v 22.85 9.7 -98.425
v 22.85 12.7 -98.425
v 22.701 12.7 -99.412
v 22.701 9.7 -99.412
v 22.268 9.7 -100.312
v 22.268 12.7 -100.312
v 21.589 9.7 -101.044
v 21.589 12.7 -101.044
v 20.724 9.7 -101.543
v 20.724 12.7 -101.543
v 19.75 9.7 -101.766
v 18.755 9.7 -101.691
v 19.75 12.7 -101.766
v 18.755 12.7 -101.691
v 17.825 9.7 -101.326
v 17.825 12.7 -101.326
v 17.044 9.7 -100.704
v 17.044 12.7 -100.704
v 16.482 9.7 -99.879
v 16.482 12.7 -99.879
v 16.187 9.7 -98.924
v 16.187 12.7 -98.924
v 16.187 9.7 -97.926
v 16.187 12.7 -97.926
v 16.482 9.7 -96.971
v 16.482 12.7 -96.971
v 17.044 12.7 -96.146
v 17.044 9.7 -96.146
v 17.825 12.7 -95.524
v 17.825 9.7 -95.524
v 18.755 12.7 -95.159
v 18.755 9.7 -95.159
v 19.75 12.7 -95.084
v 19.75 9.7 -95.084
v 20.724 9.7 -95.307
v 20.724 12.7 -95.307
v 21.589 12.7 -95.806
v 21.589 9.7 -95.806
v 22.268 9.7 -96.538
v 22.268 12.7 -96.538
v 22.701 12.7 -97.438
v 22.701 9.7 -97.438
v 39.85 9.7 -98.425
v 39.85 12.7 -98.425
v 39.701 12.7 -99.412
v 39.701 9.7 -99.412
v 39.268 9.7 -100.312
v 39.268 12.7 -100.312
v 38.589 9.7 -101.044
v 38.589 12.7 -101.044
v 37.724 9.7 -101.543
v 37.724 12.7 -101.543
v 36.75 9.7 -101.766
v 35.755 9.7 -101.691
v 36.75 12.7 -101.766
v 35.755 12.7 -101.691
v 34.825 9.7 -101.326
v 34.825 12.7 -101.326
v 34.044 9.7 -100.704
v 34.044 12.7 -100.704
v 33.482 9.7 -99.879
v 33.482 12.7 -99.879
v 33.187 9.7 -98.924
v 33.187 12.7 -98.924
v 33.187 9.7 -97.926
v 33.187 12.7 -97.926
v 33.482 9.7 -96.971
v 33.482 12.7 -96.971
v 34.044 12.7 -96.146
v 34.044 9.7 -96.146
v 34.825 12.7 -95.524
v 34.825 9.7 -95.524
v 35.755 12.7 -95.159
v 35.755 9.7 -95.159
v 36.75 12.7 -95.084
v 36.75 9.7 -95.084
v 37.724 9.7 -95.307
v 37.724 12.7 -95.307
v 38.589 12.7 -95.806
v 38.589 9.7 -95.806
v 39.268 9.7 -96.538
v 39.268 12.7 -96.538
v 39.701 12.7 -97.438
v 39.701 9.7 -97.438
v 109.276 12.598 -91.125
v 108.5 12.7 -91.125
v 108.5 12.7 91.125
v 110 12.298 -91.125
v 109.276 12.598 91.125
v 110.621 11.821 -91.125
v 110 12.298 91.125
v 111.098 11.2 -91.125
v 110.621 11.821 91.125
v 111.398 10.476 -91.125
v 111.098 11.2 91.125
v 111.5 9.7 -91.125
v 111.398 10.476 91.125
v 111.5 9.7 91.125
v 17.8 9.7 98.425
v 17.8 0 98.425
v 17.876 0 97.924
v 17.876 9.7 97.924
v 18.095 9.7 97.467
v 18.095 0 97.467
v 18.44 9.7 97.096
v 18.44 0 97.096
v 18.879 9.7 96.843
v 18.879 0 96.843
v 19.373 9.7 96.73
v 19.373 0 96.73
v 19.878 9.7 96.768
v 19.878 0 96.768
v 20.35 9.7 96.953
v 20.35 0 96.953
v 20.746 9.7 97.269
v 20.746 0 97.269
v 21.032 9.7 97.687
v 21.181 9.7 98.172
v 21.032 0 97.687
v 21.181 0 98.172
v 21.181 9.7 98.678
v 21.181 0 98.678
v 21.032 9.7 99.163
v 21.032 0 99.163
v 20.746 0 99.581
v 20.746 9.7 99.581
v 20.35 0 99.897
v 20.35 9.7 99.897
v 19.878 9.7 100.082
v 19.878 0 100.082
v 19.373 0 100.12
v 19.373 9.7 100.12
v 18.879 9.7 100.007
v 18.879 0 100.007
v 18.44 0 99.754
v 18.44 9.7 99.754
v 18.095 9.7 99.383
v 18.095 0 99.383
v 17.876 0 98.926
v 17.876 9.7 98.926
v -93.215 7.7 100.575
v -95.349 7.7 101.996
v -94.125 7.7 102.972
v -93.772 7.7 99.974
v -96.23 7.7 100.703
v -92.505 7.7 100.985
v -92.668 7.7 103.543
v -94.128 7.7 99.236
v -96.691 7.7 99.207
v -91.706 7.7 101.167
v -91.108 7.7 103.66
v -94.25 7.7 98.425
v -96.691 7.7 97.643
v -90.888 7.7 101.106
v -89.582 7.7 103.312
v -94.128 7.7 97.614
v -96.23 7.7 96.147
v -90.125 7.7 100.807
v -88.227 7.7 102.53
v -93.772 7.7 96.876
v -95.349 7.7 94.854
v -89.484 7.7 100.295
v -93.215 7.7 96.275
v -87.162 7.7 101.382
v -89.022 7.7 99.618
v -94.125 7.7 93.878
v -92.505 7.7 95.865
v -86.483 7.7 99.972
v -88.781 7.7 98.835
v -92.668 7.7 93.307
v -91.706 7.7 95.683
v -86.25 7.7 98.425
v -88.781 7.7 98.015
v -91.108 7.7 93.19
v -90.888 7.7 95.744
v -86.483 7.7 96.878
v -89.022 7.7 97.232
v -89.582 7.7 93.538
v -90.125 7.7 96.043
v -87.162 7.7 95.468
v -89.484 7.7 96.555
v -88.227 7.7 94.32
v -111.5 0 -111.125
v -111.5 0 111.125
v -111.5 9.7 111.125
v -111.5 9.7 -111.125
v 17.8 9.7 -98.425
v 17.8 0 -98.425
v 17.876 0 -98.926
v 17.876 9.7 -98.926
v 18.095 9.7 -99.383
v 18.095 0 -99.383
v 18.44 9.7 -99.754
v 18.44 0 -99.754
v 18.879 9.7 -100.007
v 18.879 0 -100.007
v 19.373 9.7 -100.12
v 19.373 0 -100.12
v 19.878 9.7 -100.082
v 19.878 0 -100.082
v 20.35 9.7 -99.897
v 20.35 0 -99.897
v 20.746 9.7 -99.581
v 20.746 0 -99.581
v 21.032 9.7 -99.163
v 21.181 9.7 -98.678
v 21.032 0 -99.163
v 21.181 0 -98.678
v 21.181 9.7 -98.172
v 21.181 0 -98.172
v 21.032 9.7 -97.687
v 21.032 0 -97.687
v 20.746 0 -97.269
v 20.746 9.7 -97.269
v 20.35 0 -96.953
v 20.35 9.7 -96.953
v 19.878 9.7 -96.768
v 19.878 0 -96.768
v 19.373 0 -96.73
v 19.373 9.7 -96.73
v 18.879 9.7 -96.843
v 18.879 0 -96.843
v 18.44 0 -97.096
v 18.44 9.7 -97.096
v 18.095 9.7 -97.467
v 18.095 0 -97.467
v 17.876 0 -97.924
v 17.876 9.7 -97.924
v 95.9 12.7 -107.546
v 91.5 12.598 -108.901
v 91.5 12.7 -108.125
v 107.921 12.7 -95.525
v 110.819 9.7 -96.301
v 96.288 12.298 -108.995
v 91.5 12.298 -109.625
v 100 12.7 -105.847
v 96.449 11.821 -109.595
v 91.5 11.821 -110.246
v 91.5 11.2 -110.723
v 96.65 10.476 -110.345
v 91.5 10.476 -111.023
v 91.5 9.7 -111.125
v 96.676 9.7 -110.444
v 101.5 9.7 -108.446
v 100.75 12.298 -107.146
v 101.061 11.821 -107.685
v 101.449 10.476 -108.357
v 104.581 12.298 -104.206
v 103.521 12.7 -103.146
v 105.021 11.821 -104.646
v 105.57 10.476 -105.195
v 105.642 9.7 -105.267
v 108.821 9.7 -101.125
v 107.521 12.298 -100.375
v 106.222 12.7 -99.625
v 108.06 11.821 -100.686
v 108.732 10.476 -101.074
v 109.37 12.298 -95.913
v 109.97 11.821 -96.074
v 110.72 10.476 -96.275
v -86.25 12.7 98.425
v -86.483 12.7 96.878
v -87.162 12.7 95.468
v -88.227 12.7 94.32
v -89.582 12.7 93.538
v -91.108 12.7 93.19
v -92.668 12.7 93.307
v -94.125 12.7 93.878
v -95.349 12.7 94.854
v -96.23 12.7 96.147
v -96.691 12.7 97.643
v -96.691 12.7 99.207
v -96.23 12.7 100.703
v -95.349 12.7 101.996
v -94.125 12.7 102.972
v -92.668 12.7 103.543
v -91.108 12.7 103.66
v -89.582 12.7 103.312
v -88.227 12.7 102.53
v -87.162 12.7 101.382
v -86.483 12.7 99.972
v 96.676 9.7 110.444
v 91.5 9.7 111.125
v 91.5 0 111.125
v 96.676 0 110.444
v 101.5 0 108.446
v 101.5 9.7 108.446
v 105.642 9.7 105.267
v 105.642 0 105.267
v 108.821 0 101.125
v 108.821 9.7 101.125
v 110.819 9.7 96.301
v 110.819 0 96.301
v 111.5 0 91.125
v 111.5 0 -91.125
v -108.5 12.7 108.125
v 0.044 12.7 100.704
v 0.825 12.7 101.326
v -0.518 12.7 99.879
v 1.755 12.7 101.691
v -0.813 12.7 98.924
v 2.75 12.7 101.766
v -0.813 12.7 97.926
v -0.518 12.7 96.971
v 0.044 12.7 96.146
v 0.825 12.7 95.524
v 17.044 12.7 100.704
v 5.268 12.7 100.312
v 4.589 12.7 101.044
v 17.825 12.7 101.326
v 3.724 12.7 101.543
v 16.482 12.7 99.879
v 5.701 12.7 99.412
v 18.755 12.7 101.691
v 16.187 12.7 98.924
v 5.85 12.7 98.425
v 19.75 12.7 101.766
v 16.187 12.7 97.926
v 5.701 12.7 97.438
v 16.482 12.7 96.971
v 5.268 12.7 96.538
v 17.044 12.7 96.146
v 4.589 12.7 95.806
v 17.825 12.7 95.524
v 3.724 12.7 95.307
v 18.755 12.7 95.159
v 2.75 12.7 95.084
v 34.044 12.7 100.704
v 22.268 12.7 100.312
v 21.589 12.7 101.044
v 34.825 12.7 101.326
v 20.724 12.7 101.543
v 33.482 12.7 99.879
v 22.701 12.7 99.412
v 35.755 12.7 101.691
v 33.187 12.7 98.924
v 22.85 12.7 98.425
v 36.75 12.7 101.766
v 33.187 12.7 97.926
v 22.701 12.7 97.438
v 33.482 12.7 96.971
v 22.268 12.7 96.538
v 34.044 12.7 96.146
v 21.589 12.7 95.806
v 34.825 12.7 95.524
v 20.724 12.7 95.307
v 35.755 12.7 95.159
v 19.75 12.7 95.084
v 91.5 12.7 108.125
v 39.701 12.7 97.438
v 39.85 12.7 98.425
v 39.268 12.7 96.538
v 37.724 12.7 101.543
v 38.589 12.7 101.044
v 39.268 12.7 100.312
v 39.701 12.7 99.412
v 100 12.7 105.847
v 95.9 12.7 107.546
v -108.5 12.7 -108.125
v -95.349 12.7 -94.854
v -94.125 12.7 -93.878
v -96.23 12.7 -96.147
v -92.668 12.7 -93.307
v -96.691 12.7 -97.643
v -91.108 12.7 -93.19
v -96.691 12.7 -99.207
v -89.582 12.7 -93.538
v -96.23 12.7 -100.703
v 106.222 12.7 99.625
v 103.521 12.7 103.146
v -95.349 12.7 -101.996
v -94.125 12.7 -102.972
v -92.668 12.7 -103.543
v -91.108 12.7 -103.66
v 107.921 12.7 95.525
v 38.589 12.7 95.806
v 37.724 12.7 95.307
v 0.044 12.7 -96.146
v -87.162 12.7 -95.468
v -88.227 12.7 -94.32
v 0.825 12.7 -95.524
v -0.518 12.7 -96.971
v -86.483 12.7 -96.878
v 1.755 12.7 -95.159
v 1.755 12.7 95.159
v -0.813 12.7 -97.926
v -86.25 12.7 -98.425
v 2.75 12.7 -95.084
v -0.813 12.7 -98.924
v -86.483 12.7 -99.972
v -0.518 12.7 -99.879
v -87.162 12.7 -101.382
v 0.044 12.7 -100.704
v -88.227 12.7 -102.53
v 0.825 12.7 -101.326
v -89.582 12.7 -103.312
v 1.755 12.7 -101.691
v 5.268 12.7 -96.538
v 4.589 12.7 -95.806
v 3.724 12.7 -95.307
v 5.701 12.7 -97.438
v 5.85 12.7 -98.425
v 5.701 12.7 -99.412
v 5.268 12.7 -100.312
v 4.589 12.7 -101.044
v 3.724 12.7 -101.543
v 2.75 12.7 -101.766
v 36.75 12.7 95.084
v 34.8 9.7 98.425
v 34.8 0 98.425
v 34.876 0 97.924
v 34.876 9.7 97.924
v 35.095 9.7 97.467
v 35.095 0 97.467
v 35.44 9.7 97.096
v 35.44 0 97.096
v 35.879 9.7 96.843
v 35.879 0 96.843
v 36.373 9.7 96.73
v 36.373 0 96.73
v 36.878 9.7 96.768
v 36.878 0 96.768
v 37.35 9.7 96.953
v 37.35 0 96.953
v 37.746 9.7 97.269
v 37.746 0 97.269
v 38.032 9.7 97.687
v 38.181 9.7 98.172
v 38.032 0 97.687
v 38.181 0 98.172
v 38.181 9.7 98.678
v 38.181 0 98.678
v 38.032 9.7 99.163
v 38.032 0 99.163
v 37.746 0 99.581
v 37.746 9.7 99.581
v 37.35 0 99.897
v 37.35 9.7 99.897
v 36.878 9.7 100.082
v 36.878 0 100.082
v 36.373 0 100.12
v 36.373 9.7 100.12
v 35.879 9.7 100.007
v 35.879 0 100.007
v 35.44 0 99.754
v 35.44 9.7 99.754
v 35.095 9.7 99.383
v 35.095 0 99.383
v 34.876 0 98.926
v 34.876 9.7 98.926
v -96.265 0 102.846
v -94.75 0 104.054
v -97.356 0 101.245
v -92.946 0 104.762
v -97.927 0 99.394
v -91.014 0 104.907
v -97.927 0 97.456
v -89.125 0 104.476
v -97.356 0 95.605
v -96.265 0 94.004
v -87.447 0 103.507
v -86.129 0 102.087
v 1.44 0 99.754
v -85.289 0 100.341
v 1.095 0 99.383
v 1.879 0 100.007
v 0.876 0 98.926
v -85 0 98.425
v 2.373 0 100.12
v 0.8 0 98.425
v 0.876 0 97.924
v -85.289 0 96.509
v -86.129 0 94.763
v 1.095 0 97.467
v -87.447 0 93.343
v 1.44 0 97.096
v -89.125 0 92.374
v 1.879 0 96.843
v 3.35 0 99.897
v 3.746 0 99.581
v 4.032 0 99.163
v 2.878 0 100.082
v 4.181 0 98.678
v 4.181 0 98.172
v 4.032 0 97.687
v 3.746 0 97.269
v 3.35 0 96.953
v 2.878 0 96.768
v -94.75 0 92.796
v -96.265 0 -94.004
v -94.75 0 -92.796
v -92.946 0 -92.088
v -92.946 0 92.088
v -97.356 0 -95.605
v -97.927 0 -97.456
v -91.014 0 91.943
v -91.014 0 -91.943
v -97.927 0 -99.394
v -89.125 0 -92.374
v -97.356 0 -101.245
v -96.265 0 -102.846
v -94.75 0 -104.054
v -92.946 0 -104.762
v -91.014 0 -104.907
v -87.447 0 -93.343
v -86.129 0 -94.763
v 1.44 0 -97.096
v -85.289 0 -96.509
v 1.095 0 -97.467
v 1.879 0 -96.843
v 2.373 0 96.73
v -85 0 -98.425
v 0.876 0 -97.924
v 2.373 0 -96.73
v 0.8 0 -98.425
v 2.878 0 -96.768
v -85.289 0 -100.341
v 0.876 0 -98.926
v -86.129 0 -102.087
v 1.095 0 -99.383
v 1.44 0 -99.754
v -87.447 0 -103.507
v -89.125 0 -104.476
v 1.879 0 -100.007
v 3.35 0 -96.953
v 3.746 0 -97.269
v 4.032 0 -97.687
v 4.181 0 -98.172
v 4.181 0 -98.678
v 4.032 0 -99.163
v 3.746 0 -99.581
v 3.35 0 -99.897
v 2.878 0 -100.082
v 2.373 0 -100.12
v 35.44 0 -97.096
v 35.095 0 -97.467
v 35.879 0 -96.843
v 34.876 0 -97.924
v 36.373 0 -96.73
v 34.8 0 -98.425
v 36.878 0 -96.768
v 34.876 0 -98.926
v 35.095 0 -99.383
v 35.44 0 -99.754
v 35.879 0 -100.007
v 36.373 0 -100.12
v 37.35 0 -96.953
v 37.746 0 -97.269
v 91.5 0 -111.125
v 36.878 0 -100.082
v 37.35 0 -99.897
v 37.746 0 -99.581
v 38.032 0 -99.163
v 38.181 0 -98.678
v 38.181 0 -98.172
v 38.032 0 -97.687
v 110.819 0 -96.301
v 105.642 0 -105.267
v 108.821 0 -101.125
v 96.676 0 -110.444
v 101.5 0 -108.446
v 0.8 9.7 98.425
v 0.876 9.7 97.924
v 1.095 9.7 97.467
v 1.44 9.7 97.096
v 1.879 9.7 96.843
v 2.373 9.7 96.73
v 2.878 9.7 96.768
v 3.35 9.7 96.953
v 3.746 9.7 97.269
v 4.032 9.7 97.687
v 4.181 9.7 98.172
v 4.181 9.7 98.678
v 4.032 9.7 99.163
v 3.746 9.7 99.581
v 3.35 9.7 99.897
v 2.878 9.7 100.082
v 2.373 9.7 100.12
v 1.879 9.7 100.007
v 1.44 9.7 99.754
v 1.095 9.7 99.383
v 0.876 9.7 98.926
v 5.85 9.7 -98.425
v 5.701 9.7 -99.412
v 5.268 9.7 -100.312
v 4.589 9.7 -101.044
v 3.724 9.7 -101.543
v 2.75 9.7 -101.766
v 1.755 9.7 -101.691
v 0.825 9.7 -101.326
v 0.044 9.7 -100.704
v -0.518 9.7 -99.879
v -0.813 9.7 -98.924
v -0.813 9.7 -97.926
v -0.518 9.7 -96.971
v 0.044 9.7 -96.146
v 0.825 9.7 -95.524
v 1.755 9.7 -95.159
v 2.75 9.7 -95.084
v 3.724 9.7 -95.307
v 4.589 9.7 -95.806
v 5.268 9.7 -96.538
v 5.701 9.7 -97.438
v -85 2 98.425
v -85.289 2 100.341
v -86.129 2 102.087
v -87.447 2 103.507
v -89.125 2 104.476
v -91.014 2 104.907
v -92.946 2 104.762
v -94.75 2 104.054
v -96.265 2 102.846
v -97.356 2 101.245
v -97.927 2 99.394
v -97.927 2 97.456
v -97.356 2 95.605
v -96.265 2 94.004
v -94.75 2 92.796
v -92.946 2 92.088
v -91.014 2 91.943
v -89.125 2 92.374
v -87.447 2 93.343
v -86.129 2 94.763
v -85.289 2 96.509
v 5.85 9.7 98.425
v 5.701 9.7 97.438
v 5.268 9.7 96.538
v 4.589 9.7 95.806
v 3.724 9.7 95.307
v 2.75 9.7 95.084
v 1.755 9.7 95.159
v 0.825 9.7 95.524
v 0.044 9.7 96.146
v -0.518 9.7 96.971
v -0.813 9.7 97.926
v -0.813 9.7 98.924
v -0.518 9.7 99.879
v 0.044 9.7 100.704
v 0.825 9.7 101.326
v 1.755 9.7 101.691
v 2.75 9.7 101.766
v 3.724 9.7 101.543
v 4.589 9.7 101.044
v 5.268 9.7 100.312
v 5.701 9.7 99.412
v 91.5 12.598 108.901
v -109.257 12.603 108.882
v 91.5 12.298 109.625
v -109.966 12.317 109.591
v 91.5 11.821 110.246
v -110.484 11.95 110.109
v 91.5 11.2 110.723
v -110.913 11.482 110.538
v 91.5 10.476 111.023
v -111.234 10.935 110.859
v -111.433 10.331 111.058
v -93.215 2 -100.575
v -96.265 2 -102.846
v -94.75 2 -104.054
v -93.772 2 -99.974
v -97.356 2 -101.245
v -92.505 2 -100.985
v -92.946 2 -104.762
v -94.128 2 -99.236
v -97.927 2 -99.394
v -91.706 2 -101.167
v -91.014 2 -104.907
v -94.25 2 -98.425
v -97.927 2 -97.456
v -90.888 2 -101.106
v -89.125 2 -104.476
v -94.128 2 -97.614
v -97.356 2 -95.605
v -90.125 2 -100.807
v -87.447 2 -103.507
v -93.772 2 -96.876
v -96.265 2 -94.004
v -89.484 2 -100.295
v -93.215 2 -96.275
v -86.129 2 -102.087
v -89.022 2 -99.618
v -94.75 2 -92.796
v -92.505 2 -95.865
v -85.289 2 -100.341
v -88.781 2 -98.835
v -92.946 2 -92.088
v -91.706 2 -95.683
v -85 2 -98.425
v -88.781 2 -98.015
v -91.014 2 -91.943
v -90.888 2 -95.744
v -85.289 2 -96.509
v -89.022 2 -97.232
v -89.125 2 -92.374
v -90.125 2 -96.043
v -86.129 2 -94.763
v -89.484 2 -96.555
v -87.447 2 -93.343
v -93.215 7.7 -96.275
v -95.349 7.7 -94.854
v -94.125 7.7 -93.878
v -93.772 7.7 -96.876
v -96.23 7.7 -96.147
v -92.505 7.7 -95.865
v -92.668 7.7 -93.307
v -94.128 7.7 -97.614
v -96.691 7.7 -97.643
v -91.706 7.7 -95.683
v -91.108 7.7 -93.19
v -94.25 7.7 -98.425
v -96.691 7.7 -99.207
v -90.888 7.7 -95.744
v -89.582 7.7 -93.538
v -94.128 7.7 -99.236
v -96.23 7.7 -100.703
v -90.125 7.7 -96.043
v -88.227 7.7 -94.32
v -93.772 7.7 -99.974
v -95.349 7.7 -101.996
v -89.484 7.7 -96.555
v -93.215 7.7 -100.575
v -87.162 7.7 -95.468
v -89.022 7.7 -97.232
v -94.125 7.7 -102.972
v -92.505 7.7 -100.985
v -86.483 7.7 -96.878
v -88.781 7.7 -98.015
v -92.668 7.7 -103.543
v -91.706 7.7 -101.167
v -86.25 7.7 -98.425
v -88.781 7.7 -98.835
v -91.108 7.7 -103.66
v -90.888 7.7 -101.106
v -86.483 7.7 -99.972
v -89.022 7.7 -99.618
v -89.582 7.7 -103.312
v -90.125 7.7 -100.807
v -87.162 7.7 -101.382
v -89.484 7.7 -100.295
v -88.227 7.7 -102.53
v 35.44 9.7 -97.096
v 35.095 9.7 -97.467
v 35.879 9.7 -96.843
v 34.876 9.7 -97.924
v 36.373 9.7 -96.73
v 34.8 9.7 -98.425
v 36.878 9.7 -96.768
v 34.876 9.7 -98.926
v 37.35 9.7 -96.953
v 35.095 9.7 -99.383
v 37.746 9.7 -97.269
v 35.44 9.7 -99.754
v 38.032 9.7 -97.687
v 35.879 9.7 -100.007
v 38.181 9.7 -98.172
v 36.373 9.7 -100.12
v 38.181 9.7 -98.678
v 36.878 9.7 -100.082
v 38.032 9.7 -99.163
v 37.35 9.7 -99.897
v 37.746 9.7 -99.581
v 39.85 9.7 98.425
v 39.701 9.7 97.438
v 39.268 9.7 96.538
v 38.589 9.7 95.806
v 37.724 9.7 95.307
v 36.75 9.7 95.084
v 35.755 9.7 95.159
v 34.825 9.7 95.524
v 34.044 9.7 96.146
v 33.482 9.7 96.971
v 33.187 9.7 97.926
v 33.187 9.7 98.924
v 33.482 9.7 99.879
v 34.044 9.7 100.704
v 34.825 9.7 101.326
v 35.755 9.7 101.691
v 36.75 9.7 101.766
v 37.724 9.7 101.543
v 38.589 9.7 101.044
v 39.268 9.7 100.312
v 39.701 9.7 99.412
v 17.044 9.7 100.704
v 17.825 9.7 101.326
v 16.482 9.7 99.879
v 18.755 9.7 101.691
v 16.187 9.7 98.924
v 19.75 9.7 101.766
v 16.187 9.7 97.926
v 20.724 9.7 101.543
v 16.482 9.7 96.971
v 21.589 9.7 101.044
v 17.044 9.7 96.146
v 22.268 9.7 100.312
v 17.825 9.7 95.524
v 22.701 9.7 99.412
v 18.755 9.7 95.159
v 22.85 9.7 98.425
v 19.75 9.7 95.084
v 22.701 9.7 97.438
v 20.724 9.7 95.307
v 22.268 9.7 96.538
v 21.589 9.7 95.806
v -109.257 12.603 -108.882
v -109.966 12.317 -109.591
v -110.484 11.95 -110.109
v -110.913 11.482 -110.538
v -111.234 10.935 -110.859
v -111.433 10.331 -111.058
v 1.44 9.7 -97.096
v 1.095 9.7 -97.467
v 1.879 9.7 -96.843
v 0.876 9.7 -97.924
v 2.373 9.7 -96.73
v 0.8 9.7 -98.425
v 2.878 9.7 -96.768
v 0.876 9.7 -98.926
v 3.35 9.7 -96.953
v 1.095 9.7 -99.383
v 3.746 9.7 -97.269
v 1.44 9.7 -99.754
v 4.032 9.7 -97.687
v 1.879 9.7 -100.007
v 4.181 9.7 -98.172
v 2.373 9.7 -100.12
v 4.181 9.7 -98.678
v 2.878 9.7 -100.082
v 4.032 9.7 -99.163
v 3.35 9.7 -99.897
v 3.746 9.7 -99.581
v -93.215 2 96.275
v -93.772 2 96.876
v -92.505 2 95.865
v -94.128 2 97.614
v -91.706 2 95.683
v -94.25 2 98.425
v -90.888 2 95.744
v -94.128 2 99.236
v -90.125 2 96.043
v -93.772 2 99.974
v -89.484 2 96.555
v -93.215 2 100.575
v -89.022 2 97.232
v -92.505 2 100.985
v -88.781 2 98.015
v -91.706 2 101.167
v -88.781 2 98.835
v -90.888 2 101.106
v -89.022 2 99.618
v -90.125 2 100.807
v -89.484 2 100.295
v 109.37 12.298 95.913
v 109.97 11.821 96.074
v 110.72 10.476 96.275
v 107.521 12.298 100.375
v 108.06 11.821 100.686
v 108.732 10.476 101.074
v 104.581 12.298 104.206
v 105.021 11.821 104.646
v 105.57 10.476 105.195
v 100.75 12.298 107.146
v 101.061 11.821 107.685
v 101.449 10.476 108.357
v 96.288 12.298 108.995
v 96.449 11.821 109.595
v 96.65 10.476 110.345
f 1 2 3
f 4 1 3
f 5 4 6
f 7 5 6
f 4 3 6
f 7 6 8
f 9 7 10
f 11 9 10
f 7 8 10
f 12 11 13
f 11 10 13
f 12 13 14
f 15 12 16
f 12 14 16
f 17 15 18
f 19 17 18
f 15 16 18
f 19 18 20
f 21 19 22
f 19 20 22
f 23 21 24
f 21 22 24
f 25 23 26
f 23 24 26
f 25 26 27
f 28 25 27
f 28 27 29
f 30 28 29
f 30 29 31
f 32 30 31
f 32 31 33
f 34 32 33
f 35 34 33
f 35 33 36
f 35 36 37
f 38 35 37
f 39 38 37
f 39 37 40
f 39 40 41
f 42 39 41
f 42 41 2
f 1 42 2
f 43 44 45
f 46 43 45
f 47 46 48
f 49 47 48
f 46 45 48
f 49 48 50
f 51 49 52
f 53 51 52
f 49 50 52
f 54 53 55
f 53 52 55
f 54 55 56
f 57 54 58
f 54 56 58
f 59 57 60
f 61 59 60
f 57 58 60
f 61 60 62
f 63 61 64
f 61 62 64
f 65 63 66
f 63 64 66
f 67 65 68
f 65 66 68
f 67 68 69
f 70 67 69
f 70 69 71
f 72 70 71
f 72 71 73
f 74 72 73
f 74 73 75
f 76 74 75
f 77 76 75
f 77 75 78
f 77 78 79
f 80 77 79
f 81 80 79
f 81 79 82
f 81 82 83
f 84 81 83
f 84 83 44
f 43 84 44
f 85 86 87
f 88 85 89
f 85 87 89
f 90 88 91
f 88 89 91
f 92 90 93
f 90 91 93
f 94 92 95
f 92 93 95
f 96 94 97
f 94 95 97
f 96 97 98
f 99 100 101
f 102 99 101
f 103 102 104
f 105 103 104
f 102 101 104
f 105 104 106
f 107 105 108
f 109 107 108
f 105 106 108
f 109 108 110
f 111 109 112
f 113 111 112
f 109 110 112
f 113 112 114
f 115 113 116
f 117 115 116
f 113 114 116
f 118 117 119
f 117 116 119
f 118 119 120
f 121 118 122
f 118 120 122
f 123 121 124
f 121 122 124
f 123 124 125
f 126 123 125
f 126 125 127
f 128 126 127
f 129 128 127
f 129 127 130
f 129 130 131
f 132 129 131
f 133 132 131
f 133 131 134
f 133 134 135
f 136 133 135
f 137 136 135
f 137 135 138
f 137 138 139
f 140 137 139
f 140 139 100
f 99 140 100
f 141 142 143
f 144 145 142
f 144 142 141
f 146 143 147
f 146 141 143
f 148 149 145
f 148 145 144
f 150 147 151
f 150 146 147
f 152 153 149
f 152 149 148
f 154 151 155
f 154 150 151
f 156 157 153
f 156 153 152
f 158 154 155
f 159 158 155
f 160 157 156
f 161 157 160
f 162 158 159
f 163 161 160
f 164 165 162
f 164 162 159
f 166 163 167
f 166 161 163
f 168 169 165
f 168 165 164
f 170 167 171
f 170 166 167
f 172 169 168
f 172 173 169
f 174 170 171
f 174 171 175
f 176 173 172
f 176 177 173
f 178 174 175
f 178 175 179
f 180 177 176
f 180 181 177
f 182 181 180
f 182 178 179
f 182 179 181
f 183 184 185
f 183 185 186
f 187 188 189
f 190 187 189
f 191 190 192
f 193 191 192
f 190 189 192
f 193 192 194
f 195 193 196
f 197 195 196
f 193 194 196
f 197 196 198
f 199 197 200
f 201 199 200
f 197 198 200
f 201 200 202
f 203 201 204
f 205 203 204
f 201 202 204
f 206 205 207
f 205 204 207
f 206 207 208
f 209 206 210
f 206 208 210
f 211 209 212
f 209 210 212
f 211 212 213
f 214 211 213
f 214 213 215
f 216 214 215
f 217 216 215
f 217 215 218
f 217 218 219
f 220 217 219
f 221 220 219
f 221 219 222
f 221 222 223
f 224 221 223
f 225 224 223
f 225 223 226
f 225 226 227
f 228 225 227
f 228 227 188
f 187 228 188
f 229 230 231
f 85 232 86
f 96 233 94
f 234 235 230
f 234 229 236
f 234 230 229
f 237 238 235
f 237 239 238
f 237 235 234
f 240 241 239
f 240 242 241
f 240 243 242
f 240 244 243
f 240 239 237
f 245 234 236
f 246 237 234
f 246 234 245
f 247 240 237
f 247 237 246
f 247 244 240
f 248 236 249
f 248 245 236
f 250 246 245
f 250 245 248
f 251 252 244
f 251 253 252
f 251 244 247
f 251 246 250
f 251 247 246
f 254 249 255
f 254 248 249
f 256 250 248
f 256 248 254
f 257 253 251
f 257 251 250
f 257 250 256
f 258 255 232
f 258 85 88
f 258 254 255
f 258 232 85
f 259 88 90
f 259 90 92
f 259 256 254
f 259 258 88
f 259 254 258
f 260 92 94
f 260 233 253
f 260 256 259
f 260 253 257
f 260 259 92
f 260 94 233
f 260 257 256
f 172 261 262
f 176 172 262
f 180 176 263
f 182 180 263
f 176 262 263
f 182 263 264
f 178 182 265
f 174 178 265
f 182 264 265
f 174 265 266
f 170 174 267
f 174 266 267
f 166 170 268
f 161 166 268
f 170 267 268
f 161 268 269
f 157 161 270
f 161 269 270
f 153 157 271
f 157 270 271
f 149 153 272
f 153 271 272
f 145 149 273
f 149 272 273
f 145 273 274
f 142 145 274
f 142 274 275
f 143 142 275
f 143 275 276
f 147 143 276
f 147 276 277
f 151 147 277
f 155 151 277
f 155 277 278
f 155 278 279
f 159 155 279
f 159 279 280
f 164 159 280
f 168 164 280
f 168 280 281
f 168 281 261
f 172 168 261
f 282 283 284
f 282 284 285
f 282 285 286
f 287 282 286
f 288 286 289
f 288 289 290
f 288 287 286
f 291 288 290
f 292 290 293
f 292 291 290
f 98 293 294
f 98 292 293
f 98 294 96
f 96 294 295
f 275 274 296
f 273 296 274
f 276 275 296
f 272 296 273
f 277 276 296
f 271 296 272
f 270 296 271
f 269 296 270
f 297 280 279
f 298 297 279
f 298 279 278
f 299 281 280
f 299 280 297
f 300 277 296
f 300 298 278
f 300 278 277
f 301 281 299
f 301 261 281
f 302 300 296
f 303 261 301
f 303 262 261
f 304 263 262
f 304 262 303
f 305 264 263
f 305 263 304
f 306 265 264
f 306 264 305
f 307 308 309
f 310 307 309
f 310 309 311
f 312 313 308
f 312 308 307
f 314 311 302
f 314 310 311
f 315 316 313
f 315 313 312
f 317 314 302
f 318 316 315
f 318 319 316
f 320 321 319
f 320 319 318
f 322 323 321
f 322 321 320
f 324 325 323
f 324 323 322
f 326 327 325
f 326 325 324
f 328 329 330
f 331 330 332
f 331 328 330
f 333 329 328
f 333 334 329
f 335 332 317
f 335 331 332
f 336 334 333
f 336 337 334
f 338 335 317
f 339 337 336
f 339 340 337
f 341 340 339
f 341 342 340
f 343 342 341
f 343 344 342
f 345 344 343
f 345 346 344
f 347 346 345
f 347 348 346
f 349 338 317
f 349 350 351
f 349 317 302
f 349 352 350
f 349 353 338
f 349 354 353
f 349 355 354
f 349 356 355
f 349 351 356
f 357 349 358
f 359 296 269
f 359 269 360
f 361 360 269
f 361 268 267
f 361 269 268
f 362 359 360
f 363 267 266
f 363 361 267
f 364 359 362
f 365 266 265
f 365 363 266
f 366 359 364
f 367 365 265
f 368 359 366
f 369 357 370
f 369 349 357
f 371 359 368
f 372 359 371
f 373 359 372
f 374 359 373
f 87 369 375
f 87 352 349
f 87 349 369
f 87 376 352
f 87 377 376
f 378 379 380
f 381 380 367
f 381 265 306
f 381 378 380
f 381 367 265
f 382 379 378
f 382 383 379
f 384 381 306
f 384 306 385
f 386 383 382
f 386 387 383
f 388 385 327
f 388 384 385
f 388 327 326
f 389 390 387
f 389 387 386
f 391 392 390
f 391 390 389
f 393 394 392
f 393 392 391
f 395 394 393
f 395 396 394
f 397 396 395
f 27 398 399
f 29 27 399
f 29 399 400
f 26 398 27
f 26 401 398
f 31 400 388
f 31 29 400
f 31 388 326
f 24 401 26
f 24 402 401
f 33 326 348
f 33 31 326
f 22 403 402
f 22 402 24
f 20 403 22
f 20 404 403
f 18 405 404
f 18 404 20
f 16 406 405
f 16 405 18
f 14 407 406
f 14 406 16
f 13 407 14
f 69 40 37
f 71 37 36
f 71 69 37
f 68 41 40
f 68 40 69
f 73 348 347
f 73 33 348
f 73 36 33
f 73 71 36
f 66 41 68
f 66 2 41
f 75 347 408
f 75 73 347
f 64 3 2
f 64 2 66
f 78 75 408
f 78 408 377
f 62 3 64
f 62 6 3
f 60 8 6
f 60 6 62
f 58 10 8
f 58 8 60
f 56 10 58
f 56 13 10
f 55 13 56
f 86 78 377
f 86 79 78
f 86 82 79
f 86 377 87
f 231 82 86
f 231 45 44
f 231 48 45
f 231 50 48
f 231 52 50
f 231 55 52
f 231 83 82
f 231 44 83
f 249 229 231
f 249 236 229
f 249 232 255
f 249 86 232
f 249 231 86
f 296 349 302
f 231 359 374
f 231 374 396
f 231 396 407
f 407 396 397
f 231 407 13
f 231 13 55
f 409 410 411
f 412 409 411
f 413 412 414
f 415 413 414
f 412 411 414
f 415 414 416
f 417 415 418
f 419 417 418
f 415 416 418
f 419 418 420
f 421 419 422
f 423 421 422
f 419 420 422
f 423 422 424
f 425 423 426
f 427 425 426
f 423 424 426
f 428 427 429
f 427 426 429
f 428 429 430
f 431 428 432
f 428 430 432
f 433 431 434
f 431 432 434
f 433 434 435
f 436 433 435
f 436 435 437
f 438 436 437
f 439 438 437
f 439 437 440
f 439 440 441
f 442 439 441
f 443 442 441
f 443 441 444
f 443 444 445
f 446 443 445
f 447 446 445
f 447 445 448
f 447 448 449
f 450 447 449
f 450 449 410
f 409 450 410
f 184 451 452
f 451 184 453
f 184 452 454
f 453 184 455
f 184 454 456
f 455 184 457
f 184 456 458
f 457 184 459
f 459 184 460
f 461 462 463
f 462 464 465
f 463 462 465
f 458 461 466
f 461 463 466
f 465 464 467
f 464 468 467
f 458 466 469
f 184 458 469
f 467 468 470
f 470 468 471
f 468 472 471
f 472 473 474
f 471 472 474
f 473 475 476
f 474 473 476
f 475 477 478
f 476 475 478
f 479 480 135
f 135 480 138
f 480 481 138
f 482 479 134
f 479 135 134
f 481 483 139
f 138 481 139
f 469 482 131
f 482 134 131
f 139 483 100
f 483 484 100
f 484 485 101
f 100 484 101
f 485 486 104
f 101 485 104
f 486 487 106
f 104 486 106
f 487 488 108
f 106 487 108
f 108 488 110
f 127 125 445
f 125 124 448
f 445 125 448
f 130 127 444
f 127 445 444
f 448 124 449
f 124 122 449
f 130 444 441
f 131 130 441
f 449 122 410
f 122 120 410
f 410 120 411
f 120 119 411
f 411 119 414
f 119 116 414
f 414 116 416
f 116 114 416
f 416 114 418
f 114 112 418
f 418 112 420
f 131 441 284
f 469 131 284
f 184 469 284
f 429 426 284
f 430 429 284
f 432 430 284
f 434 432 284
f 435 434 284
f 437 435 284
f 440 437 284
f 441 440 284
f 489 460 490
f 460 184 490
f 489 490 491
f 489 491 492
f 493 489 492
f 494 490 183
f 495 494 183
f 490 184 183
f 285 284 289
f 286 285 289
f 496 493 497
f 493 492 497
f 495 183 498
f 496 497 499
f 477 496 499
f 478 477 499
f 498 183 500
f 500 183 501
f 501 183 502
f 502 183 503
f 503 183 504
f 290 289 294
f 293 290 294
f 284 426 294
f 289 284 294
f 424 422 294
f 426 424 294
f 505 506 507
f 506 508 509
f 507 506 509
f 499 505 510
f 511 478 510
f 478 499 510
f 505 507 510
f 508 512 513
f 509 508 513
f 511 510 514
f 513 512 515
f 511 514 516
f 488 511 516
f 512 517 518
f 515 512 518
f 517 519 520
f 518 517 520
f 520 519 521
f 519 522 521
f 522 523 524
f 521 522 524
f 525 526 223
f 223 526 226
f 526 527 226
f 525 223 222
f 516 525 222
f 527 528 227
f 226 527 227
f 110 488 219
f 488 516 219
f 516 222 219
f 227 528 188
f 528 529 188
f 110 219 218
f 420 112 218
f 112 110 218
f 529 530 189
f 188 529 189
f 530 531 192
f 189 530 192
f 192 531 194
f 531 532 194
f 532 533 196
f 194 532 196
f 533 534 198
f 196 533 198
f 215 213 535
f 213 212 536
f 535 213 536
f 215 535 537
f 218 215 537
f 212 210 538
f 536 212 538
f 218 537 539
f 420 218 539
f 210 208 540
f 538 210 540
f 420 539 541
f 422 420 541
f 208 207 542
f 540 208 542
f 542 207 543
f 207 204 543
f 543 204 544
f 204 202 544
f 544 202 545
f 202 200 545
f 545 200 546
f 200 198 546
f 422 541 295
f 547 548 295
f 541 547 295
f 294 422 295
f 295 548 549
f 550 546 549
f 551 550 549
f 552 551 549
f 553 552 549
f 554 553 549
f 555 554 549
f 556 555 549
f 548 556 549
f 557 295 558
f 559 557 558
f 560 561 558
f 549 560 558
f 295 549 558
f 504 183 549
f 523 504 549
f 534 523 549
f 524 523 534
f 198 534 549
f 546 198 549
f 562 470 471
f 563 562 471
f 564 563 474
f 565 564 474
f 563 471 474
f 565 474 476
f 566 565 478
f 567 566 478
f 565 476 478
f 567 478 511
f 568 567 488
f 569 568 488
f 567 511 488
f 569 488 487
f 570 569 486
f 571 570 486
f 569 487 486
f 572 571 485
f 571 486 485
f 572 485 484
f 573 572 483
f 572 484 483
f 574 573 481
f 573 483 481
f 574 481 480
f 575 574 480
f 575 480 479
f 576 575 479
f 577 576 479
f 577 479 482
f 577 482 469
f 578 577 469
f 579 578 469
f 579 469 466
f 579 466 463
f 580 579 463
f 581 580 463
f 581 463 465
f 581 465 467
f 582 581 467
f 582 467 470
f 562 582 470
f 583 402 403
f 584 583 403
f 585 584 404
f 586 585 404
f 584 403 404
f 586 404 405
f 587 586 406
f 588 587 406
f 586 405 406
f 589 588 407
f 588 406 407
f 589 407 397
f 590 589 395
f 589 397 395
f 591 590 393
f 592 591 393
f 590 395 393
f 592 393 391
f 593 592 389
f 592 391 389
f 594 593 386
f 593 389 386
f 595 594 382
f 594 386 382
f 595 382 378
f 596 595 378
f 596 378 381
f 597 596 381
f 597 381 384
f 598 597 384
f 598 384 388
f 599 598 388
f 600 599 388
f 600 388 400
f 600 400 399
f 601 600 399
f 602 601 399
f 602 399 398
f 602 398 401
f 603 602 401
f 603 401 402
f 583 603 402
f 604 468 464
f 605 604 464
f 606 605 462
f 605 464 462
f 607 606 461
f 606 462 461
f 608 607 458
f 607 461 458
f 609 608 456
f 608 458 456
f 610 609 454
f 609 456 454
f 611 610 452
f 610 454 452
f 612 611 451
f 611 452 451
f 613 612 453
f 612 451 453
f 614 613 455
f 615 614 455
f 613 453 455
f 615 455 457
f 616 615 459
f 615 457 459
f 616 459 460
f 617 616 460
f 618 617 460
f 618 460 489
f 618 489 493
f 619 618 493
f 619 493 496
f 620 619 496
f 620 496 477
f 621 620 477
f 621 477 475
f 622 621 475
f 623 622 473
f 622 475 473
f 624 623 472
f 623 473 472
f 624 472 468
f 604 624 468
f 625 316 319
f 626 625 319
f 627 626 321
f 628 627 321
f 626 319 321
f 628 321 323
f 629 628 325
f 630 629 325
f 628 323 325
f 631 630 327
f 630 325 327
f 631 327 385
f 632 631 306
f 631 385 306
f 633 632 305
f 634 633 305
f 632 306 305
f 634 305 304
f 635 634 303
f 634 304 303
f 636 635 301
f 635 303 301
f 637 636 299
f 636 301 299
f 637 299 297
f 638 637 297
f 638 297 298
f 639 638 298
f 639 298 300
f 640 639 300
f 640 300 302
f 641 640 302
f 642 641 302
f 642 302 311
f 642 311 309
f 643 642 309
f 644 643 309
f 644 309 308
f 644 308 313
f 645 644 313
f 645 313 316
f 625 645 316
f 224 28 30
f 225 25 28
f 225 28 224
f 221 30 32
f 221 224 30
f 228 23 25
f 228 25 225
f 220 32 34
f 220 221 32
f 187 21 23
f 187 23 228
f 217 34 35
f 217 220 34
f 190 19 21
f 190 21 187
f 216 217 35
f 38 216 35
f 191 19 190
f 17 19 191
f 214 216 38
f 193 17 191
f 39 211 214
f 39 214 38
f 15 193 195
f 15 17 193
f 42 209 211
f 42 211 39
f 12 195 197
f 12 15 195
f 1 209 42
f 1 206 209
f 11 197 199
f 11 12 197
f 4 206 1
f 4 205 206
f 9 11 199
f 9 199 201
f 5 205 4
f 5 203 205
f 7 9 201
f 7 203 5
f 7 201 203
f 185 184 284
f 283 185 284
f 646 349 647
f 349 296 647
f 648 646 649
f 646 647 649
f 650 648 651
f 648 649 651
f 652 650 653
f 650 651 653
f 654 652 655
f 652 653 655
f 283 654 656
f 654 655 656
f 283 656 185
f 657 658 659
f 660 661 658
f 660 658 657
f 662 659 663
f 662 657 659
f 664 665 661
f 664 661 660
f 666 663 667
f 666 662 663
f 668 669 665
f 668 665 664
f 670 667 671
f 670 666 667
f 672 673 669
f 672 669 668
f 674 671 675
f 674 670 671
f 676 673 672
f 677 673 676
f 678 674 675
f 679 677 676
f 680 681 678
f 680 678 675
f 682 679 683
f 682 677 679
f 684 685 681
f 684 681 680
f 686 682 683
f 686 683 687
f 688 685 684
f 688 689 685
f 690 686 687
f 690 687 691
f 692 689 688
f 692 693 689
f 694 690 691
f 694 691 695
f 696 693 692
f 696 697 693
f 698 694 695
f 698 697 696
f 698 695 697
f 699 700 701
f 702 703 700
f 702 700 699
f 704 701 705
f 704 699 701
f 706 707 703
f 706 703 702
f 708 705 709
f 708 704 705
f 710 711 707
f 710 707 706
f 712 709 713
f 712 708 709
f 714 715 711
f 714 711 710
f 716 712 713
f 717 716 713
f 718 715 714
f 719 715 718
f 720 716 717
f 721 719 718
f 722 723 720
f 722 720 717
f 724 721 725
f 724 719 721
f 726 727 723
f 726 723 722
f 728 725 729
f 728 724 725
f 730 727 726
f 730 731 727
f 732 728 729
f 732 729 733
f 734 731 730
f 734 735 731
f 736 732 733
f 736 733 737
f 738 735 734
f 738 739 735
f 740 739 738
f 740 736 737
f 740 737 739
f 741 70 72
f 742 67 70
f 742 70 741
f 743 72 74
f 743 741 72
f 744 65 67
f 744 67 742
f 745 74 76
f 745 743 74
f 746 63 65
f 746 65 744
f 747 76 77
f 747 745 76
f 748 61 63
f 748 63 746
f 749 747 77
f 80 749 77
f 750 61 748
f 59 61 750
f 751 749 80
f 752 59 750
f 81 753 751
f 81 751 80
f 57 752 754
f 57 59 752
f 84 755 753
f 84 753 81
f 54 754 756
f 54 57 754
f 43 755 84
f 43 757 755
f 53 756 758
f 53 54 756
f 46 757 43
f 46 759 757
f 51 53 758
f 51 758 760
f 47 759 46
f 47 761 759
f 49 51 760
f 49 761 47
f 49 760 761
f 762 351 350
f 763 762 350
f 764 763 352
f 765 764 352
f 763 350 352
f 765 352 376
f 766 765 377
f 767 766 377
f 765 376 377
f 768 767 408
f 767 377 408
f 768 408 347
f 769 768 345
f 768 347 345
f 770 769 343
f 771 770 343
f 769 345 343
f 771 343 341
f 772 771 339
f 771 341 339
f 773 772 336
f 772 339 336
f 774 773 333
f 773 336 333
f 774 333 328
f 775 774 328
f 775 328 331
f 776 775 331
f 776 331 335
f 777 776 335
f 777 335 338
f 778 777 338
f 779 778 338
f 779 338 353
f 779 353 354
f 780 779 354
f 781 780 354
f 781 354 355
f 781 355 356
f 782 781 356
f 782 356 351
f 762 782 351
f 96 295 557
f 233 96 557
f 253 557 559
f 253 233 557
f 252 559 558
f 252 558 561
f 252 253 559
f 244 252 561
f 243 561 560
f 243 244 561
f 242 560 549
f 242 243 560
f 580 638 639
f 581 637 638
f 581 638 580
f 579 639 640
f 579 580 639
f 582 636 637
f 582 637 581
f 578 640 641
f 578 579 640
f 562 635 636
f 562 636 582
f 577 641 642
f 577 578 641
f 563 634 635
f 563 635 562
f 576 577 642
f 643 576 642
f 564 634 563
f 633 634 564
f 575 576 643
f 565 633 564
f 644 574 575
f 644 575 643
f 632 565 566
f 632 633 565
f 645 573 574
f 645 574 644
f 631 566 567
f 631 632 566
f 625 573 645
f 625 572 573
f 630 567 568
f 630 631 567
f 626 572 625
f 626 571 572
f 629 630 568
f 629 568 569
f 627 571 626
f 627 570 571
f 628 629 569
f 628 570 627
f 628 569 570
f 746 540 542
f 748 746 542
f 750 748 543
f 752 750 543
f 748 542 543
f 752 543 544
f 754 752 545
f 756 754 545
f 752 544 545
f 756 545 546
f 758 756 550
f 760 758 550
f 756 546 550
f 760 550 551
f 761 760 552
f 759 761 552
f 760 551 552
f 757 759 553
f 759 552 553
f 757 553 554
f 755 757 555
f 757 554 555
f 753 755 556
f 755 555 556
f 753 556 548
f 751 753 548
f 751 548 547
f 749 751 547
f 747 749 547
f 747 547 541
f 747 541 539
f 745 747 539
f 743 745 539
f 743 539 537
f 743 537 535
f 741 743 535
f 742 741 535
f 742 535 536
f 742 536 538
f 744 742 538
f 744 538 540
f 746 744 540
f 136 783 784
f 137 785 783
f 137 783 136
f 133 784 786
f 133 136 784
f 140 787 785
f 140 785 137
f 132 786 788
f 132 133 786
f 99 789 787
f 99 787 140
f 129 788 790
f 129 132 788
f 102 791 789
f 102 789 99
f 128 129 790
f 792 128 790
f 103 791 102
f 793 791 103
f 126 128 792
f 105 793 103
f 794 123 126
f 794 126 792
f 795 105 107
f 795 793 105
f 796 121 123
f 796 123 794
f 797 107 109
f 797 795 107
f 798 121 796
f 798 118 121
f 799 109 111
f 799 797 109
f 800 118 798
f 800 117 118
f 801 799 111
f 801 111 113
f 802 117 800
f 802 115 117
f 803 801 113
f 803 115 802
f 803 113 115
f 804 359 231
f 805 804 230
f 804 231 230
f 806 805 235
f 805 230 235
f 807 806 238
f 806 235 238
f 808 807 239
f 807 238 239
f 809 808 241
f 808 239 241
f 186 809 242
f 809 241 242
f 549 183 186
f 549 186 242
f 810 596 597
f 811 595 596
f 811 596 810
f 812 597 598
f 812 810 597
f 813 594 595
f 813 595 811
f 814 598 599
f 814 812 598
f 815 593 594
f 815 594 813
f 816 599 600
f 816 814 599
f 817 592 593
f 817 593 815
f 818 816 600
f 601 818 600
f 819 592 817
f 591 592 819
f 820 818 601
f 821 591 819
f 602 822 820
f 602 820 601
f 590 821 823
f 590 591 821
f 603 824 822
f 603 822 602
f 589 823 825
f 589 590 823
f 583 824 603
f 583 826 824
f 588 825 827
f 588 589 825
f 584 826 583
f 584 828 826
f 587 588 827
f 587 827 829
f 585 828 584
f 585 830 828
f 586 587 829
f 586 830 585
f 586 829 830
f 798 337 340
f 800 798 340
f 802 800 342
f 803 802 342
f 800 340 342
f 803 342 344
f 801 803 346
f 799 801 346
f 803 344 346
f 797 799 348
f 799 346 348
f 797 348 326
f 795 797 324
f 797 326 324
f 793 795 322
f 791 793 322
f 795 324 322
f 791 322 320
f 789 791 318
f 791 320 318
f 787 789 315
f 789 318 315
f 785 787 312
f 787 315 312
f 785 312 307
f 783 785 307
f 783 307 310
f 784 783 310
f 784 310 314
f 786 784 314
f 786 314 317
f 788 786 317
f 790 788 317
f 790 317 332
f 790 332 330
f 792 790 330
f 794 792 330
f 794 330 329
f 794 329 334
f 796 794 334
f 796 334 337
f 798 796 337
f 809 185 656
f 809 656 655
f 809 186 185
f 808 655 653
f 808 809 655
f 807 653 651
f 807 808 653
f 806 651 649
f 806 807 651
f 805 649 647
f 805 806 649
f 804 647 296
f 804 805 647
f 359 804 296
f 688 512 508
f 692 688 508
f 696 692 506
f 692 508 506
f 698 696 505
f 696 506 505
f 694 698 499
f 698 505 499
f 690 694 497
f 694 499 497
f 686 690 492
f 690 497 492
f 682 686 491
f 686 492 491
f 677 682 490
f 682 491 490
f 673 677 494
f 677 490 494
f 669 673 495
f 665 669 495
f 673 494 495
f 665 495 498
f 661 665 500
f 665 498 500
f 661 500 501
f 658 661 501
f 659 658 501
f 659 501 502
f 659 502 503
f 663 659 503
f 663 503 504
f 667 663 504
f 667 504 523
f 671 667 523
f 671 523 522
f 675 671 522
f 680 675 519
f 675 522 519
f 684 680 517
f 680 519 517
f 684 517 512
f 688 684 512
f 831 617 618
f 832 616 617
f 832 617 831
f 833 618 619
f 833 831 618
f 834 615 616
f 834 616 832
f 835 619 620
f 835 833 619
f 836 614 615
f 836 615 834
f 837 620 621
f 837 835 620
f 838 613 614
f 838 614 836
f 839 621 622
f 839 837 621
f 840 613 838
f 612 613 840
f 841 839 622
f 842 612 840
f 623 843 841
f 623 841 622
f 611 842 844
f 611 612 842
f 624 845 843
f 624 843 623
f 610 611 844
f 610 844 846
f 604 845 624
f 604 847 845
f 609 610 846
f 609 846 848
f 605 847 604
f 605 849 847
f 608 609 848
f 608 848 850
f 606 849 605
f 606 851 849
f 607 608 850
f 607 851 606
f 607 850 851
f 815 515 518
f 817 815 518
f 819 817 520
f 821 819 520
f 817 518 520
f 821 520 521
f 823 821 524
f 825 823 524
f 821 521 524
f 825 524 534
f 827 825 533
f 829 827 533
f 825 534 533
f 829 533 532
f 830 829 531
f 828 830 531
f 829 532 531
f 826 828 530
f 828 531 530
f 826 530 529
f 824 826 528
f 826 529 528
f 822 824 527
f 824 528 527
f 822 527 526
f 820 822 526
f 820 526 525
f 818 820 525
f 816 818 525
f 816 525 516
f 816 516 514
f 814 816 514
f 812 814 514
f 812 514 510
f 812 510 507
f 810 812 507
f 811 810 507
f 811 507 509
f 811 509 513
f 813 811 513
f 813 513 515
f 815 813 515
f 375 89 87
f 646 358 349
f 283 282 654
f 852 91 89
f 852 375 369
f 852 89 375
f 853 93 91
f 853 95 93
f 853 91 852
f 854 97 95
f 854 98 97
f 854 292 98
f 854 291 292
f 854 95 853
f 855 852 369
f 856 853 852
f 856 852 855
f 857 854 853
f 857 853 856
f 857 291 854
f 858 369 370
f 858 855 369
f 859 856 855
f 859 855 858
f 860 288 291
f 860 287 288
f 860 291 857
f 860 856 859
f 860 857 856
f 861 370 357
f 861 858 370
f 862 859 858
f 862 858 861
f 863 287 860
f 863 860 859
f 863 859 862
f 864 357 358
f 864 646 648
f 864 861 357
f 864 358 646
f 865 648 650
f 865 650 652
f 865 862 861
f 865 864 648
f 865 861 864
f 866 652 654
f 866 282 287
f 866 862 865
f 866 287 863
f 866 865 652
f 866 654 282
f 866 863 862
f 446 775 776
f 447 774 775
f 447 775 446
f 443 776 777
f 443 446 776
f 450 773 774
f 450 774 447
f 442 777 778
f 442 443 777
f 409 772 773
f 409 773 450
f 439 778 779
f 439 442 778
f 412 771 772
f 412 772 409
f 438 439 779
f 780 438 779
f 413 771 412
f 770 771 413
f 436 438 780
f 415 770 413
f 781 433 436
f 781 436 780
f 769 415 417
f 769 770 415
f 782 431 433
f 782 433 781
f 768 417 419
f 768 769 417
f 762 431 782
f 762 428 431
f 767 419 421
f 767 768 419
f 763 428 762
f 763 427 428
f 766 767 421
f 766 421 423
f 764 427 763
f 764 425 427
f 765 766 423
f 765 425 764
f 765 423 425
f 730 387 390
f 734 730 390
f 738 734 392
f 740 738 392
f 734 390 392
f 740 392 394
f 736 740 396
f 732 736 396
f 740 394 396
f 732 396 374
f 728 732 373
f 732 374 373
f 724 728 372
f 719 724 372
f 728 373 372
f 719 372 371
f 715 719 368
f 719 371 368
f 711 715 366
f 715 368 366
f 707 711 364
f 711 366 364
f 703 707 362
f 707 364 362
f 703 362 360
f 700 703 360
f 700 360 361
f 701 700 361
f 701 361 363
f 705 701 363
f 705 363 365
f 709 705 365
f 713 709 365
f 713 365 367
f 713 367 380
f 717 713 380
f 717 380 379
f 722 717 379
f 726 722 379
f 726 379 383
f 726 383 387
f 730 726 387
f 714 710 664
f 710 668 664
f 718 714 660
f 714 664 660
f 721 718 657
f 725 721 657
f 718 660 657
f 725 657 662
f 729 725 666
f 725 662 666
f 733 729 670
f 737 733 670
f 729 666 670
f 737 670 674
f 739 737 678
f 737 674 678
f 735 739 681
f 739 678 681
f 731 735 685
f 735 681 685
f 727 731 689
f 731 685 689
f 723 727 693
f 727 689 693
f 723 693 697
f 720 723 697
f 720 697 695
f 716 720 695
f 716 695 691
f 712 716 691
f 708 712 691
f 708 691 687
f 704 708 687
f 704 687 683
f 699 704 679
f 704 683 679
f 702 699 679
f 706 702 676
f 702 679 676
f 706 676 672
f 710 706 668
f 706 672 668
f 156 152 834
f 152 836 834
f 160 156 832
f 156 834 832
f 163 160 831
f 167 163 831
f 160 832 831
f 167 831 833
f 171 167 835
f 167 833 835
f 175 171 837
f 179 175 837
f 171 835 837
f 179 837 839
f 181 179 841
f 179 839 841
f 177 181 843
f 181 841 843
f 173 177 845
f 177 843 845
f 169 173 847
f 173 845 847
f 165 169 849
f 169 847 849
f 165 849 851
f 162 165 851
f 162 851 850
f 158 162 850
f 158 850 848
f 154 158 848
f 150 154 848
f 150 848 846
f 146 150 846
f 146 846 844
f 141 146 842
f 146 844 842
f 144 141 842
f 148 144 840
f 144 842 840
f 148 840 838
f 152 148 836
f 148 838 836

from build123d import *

# Parameters (mm, degrees)
SKETCH2_W                       = 223
SKETCH2_H                       = 222.25
BOSS_EXTRUDE1_DEPTH             = 12.7
FILLET6_R                       = 20
FILLET5_R                       = 3
CBORE_FOR_M3_SBHCS1_D           = 3.4
CBORE_FOR_M3_SBHCS1_DEPTH       = 12.7
CBORE_FOR_M3_SBHCS1_CBORE_D     = 6.7
CBORE_FOR_M3_SBHCS1_CBORE_DEPTH = 3
CBORE_FOR_M5_SBHCS1_D           = 5.5
CBORE_FOR_M5_SBHCS1_DEPTH       = 12.7
CBORE_FOR_M5_SBHCS1_CBORE_D     = 10.5
CBORE_FOR_M5_SBHCS1_CBORE_DEPTH = 5
SKETCH9_R                       = 6.5
CUT_EXTRUDE1_DEPTH              = 2


with BuildPart() as part:
    # Sketch2 → Boss-Extrude1 (new body)
    with BuildSketch(Plane(origin=(0, 0, 0), x_dir=(1, 0, 0), z_dir=(0, 1, 0))):
        Rectangle(SKETCH2_W, SKETCH2_H)
    extrude(amount=BOSS_EXTRUDE1_DEPTH)

    # Fillet6
    fillet6_edges = [part.edges().sort_by_distance(p)[0] for p in [
        (111.5, 6.35, 111.125),
        (111.5, 6.35, -111.125),
    ]]
    fillet(fillet6_edges, radius=FILLET6_R)

    # Fillet5
    fillet5_edges = [part.edges().sort_by_distance(p)[0] for p in [
        (-111.5, 12.7, 0),
        (-10, 12.7, -111.125),
        (-10, 12.7, 111.125),
        (111.5, 12.7, 0),
        (105.642135624, 12.7, 105.267135624),
        (105.642135624, 12.7, -105.267135624),
    ]]
    fillet(fillet5_edges, radius=FILLET5_R)

    # CBORE for M3 SBHCS1
    with Locations(Plane(origin=(0, 12.7, 0), x_dir=(1, 0, 0), z_dir=(0, 1, 0))):
        with Locations((36.5, -98.425), (36.5, 98.425), (19.5, -98.425), (19.5, 98.425), (2.5, -98.425), (2.5, 98.425)):
            CounterBoreHole(CBORE_FOR_M3_SBHCS1_D / 2, CBORE_FOR_M3_SBHCS1_CBORE_D / 2, CBORE_FOR_M3_SBHCS1_CBORE_DEPTH, depth=CBORE_FOR_M3_SBHCS1_DEPTH)

    # CBORE for M5 SBHCS1
    with Locations(Plane(origin=(0, 12.7, 0), x_dir=(1, 0, 0), z_dir=(0, 1, 0))):
        with Locations((-91.5, 98.425), (-91.5, -98.425)):
            CounterBoreHole(CBORE_FOR_M5_SBHCS1_D / 2, CBORE_FOR_M5_SBHCS1_CBORE_D / 2, CBORE_FOR_M5_SBHCS1_CBORE_DEPTH, depth=CBORE_FOR_M5_SBHCS1_DEPTH)

    # Sketch9 → Cut-Extrude1 (cut)
    with BuildSketch(Plane.XZ):
        with Locations((-91.5, 98.425)):
            Circle(SKETCH9_R)
        with Locations((-91.5, -98.425)):
            Circle(SKETCH9_R)
    extrude(amount=-CUT_EXTRUDE1_DEPTH, mode=Mode.SUBTRACT)


solid = part.part
